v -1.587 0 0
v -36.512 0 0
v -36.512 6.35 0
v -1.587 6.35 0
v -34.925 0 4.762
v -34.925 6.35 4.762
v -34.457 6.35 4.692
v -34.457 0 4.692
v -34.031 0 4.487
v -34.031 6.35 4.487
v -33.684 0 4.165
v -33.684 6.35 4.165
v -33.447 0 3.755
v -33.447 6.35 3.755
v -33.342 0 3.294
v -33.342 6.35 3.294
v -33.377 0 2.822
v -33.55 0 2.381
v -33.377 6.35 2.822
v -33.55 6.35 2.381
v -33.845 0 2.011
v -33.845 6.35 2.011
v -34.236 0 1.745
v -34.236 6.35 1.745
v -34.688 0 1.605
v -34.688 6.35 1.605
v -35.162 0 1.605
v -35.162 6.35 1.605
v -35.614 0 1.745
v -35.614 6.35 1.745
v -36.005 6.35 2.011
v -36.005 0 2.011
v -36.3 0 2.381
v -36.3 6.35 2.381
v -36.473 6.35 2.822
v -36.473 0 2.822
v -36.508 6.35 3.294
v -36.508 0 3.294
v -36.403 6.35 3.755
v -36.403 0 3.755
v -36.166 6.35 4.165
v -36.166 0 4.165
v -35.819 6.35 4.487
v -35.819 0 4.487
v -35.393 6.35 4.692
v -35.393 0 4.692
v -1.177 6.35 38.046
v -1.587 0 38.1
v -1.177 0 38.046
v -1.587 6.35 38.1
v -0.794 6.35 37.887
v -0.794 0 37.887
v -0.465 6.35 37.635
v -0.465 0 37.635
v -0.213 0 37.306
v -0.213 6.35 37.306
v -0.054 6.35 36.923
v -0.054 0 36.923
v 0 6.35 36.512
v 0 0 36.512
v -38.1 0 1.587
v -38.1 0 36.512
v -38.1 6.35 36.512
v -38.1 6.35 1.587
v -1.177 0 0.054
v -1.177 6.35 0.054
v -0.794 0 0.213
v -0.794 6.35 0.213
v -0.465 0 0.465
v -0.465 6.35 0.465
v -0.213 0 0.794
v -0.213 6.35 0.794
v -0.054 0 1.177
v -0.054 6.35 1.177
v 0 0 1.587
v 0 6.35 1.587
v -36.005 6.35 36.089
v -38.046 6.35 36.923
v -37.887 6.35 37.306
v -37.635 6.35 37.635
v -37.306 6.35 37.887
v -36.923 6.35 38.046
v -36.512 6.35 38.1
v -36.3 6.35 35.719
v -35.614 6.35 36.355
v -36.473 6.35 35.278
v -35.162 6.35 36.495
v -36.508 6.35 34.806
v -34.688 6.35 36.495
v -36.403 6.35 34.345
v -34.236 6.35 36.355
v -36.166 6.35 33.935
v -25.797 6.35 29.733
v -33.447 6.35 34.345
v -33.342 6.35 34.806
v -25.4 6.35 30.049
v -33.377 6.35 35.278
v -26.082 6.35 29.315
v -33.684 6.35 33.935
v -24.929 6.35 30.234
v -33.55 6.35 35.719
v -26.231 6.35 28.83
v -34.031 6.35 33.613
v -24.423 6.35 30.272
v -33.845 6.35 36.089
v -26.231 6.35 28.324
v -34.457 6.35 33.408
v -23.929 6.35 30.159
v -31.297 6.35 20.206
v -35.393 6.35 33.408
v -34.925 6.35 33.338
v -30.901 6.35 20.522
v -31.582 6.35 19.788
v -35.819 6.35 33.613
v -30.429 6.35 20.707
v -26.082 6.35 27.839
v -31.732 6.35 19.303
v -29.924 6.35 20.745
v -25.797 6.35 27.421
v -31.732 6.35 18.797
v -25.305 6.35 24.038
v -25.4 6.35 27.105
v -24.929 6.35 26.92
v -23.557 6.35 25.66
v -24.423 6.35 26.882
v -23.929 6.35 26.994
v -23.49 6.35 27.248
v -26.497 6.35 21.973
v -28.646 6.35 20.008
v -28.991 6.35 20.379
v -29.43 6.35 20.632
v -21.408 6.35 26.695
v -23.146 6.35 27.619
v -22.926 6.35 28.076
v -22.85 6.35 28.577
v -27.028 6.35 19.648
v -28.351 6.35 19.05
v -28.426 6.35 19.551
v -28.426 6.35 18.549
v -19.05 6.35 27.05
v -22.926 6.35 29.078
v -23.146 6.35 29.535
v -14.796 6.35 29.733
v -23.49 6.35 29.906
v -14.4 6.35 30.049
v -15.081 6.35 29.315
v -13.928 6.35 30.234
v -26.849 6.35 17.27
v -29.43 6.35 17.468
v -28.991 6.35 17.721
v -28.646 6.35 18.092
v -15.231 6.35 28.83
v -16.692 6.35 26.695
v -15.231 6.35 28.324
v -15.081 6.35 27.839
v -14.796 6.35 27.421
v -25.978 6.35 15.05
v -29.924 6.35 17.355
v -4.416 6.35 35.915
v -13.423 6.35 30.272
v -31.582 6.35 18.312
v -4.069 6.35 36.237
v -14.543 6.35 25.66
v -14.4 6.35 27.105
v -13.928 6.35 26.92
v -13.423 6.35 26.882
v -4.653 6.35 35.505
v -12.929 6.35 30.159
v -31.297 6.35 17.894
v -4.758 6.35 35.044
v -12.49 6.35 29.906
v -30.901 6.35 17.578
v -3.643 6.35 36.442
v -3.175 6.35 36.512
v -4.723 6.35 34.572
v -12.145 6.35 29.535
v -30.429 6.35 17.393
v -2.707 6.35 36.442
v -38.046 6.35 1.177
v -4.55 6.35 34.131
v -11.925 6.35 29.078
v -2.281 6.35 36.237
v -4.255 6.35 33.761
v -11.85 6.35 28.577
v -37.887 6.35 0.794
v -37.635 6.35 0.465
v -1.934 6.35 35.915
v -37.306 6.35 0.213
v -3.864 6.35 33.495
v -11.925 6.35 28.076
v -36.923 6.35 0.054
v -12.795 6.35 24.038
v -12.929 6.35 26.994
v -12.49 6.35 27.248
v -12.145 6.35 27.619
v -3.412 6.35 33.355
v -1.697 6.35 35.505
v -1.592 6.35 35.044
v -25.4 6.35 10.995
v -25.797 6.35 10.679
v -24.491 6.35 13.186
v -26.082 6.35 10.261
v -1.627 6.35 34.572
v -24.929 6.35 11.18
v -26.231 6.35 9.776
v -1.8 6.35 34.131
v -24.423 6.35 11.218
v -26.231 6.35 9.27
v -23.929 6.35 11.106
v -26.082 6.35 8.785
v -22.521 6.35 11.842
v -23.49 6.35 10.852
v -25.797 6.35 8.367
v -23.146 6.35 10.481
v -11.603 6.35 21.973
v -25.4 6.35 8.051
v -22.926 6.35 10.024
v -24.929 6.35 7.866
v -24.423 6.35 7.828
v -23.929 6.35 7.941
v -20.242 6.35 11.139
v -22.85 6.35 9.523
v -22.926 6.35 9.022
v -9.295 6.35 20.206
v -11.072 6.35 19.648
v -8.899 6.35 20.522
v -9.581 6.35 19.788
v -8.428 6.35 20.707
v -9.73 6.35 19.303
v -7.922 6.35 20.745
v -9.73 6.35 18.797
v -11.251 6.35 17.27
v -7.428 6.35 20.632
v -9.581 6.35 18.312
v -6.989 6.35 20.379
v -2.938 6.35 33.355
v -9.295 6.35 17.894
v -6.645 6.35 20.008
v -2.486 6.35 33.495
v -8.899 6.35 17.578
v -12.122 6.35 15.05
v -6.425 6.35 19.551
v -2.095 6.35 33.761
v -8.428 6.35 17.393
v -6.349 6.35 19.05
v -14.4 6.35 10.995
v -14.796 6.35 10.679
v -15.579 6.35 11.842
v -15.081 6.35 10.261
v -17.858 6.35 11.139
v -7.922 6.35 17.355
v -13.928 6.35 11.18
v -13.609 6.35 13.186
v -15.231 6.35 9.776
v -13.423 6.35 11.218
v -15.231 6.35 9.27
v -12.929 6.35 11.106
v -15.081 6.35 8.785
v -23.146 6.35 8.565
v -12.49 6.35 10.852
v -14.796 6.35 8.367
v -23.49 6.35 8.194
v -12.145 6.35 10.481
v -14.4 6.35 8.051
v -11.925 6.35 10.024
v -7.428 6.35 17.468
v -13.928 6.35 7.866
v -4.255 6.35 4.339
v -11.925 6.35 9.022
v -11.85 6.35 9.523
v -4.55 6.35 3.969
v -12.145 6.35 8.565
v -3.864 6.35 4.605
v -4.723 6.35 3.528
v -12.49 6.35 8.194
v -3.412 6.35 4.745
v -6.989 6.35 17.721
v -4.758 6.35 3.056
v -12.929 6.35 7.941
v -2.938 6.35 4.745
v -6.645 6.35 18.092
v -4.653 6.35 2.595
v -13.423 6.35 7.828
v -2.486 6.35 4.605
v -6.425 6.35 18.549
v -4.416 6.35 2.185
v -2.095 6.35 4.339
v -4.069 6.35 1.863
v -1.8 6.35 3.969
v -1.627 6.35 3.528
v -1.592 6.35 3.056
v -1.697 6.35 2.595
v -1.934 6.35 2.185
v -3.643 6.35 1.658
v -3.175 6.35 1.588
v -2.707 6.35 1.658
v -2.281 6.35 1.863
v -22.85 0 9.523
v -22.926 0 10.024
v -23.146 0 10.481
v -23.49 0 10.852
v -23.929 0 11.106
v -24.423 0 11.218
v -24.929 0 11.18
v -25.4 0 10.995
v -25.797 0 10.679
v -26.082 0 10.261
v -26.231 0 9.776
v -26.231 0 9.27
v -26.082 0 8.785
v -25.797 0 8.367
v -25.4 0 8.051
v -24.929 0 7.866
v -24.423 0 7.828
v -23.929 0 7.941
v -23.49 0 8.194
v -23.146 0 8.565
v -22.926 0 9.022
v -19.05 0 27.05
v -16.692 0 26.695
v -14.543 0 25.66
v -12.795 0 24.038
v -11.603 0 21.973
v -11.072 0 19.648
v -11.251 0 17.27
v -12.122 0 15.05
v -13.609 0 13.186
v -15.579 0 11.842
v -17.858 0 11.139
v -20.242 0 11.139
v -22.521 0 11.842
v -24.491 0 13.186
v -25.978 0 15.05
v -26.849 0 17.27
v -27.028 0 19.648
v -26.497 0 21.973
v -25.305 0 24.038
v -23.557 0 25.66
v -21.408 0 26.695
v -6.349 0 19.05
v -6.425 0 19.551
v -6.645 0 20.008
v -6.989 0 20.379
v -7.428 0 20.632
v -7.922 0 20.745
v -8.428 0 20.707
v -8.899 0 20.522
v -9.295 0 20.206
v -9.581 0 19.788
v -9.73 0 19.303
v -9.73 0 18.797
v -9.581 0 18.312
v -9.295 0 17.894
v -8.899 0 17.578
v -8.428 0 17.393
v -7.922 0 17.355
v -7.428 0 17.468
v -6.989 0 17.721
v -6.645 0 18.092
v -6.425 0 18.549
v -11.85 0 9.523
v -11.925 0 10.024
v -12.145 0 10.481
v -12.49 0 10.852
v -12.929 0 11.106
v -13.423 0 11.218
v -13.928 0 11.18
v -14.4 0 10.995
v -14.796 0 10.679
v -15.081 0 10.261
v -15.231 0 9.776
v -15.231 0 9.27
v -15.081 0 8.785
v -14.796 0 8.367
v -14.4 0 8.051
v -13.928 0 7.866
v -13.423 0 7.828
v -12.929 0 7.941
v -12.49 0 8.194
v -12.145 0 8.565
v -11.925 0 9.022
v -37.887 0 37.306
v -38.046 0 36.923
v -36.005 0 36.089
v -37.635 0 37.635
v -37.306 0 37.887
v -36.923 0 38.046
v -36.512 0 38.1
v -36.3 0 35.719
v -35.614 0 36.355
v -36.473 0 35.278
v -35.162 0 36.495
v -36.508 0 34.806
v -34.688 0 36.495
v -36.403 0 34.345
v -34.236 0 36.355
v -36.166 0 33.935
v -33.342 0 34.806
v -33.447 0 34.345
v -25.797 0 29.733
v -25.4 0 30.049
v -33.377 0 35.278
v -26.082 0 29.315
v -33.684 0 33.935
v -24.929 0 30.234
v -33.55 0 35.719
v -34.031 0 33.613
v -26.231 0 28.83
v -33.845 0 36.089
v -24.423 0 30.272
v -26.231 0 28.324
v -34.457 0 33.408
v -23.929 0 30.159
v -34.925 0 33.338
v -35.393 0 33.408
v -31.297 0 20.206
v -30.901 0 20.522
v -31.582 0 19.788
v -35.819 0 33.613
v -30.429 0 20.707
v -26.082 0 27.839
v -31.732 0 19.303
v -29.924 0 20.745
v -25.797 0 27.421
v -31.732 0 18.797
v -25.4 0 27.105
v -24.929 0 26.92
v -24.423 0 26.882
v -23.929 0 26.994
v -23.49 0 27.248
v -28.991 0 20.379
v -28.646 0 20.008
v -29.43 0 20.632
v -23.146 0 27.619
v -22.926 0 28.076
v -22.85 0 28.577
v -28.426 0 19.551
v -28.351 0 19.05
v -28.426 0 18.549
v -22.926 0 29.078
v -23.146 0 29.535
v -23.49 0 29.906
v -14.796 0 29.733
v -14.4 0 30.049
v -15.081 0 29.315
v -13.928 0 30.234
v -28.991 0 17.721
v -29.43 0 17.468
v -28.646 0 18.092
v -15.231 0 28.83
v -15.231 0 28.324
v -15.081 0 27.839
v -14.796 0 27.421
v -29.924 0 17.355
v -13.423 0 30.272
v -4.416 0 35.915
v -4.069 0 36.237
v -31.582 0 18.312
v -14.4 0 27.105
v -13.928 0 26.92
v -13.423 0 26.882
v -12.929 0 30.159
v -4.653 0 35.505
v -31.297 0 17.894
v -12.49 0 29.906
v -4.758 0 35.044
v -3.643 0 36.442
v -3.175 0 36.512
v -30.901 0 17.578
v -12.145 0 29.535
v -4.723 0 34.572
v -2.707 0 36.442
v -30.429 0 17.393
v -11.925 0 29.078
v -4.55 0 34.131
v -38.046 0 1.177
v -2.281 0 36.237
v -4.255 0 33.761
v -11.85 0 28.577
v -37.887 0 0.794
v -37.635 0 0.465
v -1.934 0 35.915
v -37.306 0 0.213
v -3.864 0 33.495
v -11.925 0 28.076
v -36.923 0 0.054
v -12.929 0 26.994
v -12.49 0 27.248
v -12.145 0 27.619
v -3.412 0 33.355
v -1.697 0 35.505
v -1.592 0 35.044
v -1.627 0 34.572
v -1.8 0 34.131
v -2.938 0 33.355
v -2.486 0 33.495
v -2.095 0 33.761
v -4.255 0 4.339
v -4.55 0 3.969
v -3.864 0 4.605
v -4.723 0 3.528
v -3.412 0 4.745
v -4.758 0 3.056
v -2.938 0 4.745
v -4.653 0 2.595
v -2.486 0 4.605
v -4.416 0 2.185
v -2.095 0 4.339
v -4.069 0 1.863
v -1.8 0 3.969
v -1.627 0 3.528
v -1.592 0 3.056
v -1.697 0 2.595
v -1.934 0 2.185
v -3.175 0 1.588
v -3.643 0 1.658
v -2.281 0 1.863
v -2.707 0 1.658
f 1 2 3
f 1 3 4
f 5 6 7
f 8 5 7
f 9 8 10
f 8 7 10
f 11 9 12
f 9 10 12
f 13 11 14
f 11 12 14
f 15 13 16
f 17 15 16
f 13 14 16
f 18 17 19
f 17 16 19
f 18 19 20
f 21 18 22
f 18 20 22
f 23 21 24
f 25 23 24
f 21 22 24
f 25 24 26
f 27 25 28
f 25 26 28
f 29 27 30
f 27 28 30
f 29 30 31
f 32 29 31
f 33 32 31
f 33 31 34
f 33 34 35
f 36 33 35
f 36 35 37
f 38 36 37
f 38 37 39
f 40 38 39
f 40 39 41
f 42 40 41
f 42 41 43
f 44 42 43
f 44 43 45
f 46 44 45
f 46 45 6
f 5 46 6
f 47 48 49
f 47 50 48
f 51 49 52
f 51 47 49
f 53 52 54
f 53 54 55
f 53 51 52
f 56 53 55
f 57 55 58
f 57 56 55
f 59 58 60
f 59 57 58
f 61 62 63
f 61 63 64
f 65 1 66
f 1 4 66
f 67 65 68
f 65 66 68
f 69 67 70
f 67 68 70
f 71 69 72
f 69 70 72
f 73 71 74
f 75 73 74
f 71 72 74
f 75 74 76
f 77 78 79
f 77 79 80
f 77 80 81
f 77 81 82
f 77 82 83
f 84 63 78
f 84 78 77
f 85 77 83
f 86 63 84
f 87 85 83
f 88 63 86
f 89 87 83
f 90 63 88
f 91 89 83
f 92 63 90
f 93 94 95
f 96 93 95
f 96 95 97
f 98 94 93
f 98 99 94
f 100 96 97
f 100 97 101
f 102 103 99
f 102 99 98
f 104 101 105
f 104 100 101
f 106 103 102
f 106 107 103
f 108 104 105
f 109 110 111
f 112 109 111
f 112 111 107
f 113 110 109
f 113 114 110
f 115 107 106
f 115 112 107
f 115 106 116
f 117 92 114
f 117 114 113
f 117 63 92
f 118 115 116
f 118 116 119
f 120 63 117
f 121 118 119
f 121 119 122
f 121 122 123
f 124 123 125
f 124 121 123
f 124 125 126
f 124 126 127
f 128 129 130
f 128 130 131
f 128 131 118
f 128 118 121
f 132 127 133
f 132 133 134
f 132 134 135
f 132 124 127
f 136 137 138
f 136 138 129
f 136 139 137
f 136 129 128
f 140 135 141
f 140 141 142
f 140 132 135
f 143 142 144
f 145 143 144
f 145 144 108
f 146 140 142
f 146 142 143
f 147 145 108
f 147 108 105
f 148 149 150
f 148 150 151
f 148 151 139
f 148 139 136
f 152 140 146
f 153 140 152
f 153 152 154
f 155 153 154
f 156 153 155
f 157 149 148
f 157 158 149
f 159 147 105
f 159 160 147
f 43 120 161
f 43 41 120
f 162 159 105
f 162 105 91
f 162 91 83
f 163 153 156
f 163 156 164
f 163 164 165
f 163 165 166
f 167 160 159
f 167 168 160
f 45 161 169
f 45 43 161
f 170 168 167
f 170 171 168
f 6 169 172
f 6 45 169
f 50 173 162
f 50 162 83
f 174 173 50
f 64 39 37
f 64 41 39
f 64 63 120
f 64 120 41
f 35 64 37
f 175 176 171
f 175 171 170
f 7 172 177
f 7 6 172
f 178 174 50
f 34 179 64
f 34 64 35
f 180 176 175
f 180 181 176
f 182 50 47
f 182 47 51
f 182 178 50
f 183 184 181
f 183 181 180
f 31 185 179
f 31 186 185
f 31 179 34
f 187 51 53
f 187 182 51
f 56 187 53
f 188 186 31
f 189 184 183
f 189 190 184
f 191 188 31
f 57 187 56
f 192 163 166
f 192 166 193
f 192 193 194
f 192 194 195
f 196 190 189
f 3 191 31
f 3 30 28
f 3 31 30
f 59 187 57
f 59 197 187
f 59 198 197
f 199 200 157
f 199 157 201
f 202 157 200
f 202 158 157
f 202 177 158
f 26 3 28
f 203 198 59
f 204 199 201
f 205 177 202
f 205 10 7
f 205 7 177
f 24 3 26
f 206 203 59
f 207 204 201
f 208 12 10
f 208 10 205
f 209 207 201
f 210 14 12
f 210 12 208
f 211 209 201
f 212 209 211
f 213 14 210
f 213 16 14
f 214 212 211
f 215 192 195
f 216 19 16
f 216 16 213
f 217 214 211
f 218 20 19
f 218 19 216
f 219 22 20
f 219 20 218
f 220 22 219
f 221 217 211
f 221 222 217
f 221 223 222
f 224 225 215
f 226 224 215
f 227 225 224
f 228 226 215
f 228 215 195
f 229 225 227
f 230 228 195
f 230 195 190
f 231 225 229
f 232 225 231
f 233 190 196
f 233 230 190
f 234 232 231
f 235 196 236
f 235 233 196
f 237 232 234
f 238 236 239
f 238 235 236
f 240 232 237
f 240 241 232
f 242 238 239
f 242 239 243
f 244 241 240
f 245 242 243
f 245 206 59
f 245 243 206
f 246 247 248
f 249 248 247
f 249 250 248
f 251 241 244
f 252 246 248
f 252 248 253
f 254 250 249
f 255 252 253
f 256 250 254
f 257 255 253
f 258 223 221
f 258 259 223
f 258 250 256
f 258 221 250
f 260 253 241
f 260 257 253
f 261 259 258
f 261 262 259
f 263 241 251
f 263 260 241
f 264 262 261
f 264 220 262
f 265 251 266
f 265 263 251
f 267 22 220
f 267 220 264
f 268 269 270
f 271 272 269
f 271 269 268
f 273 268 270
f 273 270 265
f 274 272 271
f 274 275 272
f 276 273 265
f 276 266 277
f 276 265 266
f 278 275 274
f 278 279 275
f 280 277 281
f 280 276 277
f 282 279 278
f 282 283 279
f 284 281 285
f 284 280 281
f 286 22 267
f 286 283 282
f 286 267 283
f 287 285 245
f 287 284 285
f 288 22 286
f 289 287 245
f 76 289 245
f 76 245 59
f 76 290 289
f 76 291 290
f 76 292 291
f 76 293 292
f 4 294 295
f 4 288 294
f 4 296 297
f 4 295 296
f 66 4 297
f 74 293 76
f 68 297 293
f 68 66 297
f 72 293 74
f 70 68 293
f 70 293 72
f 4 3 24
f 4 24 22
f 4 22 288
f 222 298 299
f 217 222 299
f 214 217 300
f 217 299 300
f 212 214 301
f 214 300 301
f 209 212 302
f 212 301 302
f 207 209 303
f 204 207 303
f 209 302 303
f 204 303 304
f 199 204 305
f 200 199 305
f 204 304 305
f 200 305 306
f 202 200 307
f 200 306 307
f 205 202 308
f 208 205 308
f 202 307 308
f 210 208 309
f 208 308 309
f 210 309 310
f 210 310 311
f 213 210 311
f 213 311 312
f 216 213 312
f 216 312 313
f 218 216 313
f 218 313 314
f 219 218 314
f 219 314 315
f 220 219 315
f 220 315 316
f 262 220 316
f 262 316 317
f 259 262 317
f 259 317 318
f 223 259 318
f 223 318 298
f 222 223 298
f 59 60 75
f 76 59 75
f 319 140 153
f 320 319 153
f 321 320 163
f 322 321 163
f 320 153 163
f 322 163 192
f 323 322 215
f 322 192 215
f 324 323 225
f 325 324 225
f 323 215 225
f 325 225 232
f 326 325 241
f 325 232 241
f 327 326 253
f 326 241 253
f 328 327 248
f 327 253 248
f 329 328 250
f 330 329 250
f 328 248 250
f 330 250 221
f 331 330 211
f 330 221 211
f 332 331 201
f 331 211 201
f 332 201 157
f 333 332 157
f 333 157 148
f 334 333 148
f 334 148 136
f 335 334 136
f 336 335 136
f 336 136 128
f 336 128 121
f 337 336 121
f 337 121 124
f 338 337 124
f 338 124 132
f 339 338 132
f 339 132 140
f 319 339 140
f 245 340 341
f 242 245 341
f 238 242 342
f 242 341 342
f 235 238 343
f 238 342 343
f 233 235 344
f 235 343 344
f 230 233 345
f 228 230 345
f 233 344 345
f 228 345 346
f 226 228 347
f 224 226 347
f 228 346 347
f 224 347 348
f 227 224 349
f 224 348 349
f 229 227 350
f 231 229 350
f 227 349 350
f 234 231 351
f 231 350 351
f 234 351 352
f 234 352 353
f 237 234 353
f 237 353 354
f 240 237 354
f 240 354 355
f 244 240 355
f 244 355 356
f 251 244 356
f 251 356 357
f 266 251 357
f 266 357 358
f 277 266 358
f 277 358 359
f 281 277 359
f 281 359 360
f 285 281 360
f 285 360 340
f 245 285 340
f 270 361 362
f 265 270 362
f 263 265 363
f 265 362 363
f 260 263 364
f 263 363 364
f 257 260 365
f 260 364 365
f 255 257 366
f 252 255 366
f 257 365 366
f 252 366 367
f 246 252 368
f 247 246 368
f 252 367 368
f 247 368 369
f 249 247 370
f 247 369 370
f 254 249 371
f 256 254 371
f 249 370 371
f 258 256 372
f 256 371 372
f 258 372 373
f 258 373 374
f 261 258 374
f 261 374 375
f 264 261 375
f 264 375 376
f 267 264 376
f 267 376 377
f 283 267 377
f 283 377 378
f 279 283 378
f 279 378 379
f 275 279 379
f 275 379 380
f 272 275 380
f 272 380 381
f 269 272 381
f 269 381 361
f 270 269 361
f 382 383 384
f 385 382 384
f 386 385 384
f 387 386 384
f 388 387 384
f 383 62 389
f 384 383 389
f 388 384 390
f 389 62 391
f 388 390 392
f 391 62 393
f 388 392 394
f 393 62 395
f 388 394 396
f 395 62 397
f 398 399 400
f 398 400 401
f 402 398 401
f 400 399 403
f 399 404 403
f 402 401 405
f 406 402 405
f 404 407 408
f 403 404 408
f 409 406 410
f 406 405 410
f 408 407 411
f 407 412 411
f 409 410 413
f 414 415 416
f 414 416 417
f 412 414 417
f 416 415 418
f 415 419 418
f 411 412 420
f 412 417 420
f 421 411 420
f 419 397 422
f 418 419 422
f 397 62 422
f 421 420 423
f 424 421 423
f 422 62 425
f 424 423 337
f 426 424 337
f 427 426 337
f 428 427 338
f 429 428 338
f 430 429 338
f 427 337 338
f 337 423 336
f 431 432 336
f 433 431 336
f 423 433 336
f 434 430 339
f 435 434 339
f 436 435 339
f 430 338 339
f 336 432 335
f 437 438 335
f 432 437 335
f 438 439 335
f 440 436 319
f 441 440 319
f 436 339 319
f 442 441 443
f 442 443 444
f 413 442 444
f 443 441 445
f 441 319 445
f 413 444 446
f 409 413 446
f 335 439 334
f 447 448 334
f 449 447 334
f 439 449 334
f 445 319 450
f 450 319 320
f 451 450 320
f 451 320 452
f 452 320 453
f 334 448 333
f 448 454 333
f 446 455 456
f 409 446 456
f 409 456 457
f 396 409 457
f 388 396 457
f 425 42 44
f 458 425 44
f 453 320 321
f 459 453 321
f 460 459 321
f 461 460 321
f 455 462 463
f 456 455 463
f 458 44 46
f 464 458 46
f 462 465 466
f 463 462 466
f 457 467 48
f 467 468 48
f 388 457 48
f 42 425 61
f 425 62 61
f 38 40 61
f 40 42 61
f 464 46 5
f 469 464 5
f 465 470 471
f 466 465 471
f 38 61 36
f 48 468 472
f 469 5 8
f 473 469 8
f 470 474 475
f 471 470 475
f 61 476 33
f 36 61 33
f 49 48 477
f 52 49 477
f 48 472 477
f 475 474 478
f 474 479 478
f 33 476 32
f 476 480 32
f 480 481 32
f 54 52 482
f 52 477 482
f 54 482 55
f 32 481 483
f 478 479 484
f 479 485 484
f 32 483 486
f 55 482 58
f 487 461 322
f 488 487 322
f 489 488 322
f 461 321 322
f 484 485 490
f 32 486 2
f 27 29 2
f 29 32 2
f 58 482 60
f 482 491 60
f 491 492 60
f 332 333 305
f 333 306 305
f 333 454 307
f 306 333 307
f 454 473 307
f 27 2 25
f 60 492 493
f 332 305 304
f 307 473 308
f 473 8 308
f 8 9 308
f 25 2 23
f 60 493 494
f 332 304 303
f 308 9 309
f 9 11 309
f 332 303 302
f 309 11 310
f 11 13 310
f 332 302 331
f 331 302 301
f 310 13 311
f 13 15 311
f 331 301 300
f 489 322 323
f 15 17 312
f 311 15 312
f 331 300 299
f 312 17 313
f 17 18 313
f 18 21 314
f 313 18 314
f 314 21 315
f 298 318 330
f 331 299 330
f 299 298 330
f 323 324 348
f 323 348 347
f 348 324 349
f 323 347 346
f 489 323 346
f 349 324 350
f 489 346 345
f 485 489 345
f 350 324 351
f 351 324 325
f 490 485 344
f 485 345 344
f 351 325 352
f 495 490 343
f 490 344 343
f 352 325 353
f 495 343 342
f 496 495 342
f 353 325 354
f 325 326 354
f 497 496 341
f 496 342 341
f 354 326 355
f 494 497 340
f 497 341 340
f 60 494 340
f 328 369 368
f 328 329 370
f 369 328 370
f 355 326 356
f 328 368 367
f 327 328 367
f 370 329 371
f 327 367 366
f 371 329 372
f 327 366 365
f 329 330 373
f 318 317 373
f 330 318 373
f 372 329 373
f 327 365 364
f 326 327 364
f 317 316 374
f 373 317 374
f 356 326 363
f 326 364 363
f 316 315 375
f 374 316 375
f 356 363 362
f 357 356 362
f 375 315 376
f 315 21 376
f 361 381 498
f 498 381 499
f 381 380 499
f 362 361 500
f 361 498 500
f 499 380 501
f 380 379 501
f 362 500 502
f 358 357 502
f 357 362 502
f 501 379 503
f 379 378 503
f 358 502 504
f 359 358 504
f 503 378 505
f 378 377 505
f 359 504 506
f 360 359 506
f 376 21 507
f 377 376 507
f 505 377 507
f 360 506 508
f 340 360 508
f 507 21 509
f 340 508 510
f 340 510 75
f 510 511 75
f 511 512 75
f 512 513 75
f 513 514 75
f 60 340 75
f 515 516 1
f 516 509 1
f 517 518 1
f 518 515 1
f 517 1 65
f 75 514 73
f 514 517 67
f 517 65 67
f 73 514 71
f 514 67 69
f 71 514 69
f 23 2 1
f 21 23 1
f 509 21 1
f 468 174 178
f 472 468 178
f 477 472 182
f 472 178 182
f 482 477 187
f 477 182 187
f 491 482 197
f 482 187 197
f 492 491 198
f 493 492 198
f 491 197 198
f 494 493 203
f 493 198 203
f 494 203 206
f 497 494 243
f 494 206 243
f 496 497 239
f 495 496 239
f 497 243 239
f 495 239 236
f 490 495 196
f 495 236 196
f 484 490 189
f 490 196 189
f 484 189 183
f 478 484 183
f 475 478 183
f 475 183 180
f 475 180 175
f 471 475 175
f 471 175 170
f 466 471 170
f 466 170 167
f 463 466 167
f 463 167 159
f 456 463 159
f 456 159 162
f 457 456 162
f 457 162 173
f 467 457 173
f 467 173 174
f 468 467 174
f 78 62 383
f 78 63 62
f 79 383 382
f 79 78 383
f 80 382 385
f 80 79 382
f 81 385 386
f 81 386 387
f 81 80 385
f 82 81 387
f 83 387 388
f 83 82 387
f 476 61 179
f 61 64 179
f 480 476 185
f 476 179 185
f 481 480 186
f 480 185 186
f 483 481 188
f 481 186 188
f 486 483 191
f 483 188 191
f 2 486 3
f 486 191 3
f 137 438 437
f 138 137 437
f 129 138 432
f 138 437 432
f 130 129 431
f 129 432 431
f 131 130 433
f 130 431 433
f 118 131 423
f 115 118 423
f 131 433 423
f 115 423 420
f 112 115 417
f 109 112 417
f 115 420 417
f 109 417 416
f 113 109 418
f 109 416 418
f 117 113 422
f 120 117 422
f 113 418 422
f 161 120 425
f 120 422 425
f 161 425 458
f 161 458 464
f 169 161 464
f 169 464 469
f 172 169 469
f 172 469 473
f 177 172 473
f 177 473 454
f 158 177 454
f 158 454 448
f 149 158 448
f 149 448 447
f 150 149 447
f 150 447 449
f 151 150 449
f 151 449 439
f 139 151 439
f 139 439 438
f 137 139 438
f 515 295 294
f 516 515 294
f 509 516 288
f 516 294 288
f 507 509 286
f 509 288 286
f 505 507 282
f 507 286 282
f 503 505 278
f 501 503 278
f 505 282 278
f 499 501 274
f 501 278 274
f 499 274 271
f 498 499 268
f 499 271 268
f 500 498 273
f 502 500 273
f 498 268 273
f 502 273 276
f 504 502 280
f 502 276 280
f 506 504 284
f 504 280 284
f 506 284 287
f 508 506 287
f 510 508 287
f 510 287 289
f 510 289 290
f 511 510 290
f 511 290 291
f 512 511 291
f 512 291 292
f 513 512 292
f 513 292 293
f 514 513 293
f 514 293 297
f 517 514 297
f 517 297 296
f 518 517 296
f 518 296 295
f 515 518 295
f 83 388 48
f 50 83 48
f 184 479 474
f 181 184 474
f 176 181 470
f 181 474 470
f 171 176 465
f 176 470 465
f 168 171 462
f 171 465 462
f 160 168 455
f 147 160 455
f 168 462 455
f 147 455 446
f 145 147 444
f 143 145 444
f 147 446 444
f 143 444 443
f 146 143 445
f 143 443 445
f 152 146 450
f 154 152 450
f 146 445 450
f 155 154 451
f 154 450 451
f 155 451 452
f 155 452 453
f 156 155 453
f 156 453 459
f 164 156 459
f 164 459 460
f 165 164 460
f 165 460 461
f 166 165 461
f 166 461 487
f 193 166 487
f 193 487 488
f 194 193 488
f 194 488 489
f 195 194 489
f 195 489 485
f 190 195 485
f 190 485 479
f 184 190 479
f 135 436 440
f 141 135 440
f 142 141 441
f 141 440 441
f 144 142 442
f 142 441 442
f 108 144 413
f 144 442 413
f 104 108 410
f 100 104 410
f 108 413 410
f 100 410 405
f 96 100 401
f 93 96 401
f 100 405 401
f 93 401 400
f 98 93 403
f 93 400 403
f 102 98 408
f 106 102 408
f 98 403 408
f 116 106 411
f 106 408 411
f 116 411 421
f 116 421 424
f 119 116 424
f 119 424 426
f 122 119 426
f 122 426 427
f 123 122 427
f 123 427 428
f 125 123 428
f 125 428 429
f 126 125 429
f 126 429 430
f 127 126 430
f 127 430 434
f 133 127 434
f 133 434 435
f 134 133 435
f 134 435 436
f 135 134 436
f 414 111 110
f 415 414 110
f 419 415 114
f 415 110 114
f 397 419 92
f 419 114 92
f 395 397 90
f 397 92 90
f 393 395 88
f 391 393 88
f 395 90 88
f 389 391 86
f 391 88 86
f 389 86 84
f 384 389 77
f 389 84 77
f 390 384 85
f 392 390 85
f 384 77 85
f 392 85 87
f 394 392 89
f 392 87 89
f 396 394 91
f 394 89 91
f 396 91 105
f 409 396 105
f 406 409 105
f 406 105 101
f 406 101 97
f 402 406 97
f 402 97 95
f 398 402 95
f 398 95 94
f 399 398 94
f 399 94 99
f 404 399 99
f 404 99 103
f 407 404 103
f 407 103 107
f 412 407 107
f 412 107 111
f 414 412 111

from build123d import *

# Parameters (mm, degrees)
SKETCH1_W            = 38.1
SKETCH1_H            = 38.1
BOSS_EXTRUDE1_DEPTH  = 6.35
SKETCH5_R            = 8
CUT_EXTRUDE1_DEPTH   = 55.254423783
M3_CLEARANCE_HOLE1_D = 3.4
SKETCH6_R            = 1.5875
CUT_EXTRUDE2_DEPTH   = 55.254423783
FILLET1_R            = 1.5875


with BuildPart() as part:
    # Sketch1 → Boss-Extrude1 (new body)
    with BuildSketch(Plane(origin=(0, 0, 0), x_dir=(1, 0, 0), z_dir=(0, 1, 0))):
        with Locations((-19.05, -19.05)):
            Rectangle(SKETCH1_W, SKETCH1_H)
    extrude(amount=BOSS_EXTRUDE1_DEPTH)

    # Sketch5 → Cut-Extrude1 (cut, through all)
    with BuildSketch(Plane(origin=(0, 6.35, 0), x_dir=(1, 0, 0), z_dir=(0, 1, 0))):
        with Locations(Location((-19.05, -19.05, 0), (0, 0, 270))):
            Circle(SKETCH5_R)
    extrude(amount=-CUT_EXTRUDE1_DEPTH, mode=Mode.SUBTRACT)

    # M3 Clearance Hole1 (through all)
    with Locations(Plane(origin=(0, 6.35, 0), x_dir=(-1, 0, 0), z_dir=(0, 1, 0))):
        with Locations((30.05074, 19.05), (24.55037, 9.5230797), (13.54963, 9.5230797), (8.04926, 19.05), (13.54963, 28.5769203), (24.55037, 28.5769203)):
            Hole(M3_CLEARANCE_HOLE1_D / 2)

    # Sketch6 → Cut-Extrude2 (cut, through all)
    with BuildSketch(Plane(origin=(0, 6.35, 0), x_dir=(1, 0, 0), z_dir=(0, 1, 0))):
        with Locations(Location((-34.925, -3.175, 0), (0, 0, 270))):
            Circle(SKETCH6_R)
        with Locations(Location((-3.175, -3.175, 0), (0, 0, 90))):
            Circle(SKETCH6_R)
        with Locations(Location((-3.175, -34.925, 0), (0, 0, 270))):
            Circle(SKETCH6_R)
        with Locations(Location((-34.925, -34.925, 0), (0, 0, 90))):
            Circle(SKETCH6_R)
    extrude(amount=-CUT_EXTRUDE2_DEPTH, mode=Mode.SUBTRACT)

    # Fillet1
    fillet1_edges = [part.edges().sort_by_distance(p)[0] for p in [
        (0, 3.175, 38.1),
        (-38.1, 3.175, 38.1),
        (-38.1, 3.175, 0),
        (0, 3.175, 0),
    ]]
    fillet(fillet1_edges, radius=FILLET1_R)


solid = part.part
